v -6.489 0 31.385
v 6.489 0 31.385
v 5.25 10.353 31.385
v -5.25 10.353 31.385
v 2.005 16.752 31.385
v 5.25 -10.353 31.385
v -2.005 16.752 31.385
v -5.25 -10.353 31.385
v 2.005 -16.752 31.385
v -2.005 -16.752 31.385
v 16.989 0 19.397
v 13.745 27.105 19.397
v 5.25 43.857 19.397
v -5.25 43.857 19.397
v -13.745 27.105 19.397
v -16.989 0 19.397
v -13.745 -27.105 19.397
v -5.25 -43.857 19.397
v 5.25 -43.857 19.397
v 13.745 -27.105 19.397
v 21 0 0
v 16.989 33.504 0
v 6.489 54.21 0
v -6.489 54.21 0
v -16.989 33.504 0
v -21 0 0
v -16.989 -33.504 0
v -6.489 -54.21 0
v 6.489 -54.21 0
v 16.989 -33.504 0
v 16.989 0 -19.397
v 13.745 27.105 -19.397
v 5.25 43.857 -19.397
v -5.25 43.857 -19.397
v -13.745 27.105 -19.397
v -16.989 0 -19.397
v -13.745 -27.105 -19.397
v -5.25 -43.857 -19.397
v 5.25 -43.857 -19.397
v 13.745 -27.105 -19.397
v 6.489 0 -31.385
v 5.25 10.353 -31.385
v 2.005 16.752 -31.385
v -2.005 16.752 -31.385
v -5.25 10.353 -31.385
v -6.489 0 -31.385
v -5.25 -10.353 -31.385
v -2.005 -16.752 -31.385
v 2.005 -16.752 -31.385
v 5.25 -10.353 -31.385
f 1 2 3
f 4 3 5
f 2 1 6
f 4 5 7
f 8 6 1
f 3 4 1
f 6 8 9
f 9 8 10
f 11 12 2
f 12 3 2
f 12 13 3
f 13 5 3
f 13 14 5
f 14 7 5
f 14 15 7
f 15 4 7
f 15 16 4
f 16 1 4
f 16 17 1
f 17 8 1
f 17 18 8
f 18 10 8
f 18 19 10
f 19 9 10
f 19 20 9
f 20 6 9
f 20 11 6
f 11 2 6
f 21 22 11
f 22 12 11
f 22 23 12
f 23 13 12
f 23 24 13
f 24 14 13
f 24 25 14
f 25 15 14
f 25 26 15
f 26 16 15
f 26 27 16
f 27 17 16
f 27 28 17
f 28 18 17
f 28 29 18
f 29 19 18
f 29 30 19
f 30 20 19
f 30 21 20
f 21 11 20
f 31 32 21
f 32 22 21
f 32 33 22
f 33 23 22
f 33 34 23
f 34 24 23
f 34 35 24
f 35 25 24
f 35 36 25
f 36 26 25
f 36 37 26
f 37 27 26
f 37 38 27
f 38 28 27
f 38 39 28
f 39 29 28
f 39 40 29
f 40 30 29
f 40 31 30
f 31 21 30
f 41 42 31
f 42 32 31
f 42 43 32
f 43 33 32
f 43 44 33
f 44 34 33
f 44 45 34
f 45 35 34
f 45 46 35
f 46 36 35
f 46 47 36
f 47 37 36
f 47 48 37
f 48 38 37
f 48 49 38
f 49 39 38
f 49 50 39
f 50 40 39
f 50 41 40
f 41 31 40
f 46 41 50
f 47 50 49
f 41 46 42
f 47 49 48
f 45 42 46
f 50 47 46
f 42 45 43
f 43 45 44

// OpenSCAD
// Generated by SolidPython 1.0.1 on 2020-07-29 00:46:48


scale(v = [7, 19, 11]) {
	sphere(r = 3);
}
/***********************************************
*********      SolidPython code:      **********
************************************************
 
# import packages: SolidPython
from solid import *
from solid.utils import *
from itertools import chain, combinations, permutations


class Resize:

    def __init__(self, scad_file):
        self.scad_file = scad_file
        #self.scad_file = import_scad(scad_file)
        # cone/cylinder param:
        self.r1 = 0
        self.r2 = 0
        self.h = 0
        # rectangular prism param:
        self.w = 0
        self.l = 0
        # ellipse param:
        self.r = 0

    # import OpenScad code (file name corresponds to shape)


    # classify shape + parameters
    def assign(self, param1, param2, param3):
        if self.scad_file == 'cone.scad':
            self.r1 = param1
            self.r2 = param2
            self.h = param3
        elif self.scad_file == 'cylinder.scad':
            self.r1 = param1
            self.r2 = param2
            self.h = param3
        elif self.scad_file == 'rectangularPrism.scad':
            self.h = param1
            self.l = param2
            self.w = param3
        else:
            self.r = param1
            self.h = param2

    # resize parameters
    def iterate(self):
        x = range(3, 20, 2)
        i = 1
        if self.scad_file == 'cone.scad':
            tempList = list(permutations(x, 2))
            for temp in tempList:
                param1 = temp[0]
                param2 = temp[1]
                filepath = 'produced_scad_files/' + 'cone' + str(param1) + '_' + str(param2) + '_' + '.scad'
                scad_render_to_file(cylinder(h=param1, r1=param2, r2=0), filepath)

        elif self.scad_file == 'cylinder.scad':
            tempList = list(permutations(x, 3))
            for temp in tempList:
                param1 = temp[0]
                param2 = temp[1]
                filepath = 'produced_scad_files/' + 'cylinder' + str(param1) + '_' + str(param2) + '_' + '.scad'
                scad_render_to_file(cylinder(h=param1, r1=param2, r2=param2), filepath)

        elif self.scad_file == 'rectangularPrism.scad':
            tempList = list(permutations(x, 3))
            for temp in tempList:
                param1 = temp[0]
                param2 = temp[1]
                param3 = temp[2]
                filepath = 'produced_scad_files/' + 'rectangularPrism' + str(param1) + '_' + str(param2) + '_' + str(
                    param3) + '.scad'
                scad_render_to_file(cube(size=(param1, param2, param3)), filepath)

        elif self.scad_file == 'ellipse.scad':
            tempList = list(permutations(x, 4))
            for temp in tempList:
                param1 = temp[0]
                param2 = temp[1]
                param3 = temp[2]
                param4 = temp[3]
                filepath = 'produced_scad_files/' + 'ellipse' + str(param1) + '_' + str(param2) + '_' + str(param3) + '_' + str(param4) + '.scad'
                scad_render_to_file(scale([param1, param2, param3])(sphere(r=param4)), filepath)

    def render_to_scadfile(self):
        scad_render_to_file(scad, 'example.scad') 
 
************************************************/
